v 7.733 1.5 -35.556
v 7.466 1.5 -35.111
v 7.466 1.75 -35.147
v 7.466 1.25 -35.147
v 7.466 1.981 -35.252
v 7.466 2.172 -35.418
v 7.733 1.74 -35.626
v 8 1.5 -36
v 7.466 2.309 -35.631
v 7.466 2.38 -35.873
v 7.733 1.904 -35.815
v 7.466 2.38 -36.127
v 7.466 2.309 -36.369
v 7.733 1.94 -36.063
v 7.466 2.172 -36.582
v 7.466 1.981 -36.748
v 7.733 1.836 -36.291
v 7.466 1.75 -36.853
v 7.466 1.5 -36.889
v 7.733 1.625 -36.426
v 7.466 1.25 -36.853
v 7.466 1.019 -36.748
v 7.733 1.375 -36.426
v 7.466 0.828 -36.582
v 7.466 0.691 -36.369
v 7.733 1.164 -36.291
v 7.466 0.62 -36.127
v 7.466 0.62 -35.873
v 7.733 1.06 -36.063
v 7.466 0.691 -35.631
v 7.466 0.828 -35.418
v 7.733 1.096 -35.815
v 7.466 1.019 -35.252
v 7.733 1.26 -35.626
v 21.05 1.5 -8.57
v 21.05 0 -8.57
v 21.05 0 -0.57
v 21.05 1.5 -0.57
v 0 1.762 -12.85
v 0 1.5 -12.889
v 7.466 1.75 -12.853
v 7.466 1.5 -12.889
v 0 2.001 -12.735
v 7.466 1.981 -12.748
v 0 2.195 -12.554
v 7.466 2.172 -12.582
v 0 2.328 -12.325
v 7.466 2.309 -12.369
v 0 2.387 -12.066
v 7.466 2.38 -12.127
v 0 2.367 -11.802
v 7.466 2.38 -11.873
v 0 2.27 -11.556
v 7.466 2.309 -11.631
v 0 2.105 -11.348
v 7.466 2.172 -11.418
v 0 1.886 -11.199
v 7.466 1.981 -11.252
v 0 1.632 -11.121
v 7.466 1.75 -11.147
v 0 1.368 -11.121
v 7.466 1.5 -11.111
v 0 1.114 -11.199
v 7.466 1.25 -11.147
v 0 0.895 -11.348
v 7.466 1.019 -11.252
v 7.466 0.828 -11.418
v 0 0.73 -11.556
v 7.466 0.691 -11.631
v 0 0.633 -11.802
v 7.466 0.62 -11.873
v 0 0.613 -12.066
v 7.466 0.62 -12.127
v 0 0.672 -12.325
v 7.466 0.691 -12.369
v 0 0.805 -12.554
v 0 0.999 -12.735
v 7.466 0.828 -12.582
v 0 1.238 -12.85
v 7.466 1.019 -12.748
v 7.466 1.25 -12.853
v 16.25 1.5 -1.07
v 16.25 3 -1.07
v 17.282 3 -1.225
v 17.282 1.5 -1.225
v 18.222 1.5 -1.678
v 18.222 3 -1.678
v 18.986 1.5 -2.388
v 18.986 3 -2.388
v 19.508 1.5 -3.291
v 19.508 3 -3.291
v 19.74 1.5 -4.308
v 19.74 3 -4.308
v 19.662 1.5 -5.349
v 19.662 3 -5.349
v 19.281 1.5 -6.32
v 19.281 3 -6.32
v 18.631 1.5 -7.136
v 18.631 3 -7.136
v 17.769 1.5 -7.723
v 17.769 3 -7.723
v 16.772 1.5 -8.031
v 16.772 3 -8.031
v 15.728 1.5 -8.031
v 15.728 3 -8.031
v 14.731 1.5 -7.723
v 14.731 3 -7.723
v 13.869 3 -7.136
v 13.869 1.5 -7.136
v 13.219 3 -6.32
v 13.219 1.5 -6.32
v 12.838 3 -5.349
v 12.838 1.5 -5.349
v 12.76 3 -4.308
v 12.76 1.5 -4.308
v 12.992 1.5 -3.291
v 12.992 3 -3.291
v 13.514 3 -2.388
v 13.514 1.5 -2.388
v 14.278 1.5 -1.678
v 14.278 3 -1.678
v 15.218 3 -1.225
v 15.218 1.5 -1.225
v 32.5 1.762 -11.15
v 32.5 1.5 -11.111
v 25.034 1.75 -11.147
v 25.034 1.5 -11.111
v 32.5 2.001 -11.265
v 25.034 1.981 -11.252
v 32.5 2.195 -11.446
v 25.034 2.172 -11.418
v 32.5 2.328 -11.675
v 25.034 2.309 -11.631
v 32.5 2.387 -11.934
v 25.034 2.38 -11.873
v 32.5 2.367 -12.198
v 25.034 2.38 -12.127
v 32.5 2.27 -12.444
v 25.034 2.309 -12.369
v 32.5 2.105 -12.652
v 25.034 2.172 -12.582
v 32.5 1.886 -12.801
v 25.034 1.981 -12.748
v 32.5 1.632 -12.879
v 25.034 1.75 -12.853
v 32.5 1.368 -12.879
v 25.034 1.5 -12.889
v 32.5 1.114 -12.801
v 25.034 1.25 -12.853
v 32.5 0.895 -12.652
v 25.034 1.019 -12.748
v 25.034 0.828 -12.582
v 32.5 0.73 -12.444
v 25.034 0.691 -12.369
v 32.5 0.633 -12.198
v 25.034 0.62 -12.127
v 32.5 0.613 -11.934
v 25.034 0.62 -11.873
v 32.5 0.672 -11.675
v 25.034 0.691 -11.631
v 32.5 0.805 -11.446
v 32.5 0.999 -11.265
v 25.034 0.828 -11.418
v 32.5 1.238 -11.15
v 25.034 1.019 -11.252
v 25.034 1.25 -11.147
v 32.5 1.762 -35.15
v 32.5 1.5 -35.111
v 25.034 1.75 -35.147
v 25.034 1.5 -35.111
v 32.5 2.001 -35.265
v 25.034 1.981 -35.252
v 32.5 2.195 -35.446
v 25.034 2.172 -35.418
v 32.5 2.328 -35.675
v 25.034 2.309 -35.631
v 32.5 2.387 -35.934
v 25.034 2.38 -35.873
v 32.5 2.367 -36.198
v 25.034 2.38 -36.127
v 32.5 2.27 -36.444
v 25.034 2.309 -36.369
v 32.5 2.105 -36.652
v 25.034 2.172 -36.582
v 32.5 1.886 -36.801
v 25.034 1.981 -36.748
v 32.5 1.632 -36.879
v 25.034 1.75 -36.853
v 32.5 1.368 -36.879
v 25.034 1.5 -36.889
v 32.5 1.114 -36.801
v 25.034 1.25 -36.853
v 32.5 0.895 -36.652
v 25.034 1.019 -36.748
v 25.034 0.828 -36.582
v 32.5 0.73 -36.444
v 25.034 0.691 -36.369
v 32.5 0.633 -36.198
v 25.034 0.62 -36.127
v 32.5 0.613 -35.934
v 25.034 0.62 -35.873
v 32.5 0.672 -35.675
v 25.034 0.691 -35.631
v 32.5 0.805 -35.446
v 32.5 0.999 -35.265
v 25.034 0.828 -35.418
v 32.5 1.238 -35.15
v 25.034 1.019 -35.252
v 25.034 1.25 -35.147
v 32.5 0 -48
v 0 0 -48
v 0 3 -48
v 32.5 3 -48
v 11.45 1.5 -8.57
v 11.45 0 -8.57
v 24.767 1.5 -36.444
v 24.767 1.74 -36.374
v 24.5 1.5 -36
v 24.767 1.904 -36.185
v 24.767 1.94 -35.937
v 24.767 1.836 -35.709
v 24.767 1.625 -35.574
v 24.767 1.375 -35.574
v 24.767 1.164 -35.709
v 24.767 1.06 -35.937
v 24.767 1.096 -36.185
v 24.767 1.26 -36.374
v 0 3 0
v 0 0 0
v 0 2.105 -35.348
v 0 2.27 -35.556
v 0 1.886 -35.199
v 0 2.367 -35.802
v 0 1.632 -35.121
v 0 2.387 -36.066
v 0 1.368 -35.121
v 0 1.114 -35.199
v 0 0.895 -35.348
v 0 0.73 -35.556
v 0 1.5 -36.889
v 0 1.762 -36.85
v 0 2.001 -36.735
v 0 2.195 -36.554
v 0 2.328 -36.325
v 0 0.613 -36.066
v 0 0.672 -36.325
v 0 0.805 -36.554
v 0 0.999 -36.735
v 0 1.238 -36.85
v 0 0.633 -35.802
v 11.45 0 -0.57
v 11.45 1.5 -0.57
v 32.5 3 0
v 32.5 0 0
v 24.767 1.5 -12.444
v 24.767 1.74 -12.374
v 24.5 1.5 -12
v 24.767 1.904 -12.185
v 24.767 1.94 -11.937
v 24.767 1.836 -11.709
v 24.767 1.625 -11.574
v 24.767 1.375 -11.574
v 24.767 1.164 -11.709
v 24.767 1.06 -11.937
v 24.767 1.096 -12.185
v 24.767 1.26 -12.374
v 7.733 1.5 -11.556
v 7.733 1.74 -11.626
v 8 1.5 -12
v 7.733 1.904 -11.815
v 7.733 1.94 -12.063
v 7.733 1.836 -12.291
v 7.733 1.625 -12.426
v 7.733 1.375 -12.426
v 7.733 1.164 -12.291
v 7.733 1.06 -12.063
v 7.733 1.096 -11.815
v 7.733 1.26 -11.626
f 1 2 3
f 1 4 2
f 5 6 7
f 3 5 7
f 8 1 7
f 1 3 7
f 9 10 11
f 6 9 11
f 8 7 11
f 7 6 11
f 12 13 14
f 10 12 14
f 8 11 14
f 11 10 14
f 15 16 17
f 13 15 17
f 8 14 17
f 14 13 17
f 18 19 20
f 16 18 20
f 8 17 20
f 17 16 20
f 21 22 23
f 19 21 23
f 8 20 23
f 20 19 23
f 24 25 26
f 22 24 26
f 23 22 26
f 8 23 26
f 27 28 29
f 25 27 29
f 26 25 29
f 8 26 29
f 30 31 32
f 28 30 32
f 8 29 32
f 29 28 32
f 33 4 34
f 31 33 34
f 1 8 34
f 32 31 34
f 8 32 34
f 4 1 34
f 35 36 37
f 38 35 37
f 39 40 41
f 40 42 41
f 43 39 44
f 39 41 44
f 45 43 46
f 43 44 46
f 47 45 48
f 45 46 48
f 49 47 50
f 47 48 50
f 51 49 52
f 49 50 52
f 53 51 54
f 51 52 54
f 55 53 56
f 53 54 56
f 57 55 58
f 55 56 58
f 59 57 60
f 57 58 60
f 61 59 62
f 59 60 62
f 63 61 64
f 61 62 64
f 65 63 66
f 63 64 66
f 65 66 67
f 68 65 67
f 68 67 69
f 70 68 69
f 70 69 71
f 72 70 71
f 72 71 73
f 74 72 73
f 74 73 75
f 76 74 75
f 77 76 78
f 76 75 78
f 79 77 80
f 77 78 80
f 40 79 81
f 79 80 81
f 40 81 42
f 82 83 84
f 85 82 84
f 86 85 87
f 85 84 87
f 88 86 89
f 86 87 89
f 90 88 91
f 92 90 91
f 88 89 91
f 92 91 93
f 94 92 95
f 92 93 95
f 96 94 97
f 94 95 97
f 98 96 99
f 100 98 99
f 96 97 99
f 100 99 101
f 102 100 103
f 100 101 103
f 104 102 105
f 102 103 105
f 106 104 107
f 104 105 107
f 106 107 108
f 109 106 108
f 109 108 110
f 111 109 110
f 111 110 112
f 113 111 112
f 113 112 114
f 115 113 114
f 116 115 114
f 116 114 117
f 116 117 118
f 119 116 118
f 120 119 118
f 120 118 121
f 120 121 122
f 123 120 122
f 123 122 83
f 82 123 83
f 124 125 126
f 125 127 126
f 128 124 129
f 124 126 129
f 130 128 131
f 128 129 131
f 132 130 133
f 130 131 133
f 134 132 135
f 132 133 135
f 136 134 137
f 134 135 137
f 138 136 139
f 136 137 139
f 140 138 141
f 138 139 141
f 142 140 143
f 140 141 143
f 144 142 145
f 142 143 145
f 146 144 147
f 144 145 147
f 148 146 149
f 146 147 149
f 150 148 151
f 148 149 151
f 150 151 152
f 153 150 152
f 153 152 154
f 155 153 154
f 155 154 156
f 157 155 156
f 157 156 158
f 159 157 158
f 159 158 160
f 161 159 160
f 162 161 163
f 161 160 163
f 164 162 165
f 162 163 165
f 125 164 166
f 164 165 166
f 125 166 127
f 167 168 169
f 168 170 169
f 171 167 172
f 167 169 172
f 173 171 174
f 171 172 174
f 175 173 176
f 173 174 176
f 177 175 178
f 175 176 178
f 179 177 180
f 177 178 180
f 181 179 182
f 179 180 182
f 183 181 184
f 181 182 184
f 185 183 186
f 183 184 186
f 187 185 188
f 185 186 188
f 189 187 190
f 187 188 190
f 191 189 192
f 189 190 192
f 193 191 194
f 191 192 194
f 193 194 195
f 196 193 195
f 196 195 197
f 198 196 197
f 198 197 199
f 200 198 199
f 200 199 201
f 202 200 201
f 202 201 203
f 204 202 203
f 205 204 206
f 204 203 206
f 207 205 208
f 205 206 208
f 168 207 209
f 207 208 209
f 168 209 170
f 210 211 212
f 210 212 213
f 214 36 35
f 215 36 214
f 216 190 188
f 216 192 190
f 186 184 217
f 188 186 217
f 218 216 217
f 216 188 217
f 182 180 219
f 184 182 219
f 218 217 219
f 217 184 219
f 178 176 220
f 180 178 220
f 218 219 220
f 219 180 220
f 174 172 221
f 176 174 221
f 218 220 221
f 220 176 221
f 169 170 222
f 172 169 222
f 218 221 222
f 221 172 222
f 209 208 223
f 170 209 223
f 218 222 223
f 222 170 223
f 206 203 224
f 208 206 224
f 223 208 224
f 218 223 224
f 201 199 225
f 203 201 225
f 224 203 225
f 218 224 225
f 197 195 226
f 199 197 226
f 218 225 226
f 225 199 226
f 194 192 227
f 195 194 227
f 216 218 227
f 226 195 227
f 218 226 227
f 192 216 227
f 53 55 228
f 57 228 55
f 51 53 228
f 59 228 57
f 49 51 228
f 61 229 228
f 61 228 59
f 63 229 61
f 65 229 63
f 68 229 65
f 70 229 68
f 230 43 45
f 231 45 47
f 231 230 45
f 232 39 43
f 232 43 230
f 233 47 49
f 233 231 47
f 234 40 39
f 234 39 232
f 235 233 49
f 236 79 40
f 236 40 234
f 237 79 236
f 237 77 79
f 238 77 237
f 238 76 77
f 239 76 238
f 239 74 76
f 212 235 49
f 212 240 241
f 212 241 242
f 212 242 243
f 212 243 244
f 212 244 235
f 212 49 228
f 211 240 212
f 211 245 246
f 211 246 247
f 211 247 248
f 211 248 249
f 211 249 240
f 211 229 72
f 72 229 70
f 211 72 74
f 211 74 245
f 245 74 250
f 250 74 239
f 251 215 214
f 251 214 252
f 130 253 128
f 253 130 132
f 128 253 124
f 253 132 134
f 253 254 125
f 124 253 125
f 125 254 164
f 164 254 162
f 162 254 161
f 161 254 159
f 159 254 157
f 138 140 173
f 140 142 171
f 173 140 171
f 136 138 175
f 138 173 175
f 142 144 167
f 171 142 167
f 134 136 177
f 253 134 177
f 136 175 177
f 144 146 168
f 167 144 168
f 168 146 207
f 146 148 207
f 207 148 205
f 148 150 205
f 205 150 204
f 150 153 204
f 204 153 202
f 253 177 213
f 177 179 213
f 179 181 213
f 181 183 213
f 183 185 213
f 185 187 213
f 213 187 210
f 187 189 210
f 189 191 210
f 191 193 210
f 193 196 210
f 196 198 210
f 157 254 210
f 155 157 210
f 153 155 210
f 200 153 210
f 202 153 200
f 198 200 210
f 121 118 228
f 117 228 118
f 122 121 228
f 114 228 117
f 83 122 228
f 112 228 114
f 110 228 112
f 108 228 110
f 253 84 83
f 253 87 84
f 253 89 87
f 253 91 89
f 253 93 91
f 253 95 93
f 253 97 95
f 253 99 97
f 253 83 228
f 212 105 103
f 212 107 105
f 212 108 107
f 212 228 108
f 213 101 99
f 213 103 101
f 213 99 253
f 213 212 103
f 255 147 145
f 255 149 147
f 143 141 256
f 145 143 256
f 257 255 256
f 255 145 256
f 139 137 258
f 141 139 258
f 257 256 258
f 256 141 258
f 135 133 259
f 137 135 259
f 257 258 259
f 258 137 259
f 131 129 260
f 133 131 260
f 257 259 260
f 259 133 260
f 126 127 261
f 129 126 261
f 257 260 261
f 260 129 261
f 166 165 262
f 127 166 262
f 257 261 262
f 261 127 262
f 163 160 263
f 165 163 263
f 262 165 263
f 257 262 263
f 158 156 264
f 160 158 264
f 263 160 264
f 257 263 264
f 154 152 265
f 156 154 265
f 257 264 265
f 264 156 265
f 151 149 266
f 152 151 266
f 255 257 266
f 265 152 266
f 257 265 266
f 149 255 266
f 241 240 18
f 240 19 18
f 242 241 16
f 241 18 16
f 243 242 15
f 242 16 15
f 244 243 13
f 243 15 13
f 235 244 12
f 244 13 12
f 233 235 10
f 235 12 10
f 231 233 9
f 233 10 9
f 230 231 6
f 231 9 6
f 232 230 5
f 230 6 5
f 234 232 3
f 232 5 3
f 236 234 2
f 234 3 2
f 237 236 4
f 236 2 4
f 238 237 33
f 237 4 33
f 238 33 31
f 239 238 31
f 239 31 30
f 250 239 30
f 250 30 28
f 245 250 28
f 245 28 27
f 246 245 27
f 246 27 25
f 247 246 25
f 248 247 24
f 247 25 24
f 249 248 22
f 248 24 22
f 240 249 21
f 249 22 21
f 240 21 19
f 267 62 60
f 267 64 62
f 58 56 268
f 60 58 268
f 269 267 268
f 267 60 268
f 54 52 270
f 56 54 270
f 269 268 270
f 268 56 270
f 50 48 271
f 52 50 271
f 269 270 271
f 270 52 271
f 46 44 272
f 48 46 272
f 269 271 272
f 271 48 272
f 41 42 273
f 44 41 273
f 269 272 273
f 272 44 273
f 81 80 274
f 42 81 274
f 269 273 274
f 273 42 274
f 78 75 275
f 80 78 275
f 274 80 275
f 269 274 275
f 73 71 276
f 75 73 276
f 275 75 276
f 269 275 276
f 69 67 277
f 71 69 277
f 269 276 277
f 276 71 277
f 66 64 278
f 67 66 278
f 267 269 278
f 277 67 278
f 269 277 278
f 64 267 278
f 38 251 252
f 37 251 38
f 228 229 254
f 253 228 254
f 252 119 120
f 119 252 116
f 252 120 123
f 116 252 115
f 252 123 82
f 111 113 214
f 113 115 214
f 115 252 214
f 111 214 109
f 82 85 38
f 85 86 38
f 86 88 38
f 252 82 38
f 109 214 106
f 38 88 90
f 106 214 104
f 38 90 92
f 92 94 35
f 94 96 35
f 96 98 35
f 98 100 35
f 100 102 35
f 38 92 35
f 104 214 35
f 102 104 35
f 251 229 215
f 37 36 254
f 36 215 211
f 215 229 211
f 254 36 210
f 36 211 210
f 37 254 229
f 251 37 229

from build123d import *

# Parameters (mm, degrees)
SKETCH1_W                 = 32.5
SKETCH1_H                 = 48
BOSS_EXTRUDE1_DEPTH       = 3
F_2_56_TAPPED_HOLE1_D     = 1.778
F_2_56_TAPPED_HOLE1_DEPTH = 7.46583491
F_2_56_TAPPED_HOLE1_TIP   = 0.53416509
F_2_56_TAPPED_HOLE2_D     = 1.778
F_2_56_TAPPED_HOLE2_DEPTH = 7.46583491
F_2_56_TAPPED_HOLE2_TIP   = 0.53416509
CUT_EXTRUDE2_DEPTH        = 1.5
SKETCH10_R                = 3.5
CUT_EXTRUDE3_DEPTH        = 3


with BuildPart() as part:
    # Sketch1 → Boss-Extrude1 (new body)
    with BuildSketch(Plane(origin=(0, 0, 0), x_dir=(1, 0, 0), z_dir=(0, 1, 0))):
        with Locations((16.25, 24)):
            Rectangle(SKETCH1_W, SKETCH1_H)
    extrude(amount=BOSS_EXTRUDE1_DEPTH)

    # #2-56 Tapped Hole1
    with Locations(Plane.ZY):
        with Locations((-36, 1.5), (-12, 1.5)):
            Hole(F_2_56_TAPPED_HOLE1_D / 2, depth=F_2_56_TAPPED_HOLE1_DEPTH)
            with Locations((0, 0, -(F_2_56_TAPPED_HOLE1_DEPTH + F_2_56_TAPPED_HOLE1_TIP / 2))):  # 118° drill point
                Cone(0, F_2_56_TAPPED_HOLE1_D / 2, F_2_56_TAPPED_HOLE1_TIP, mode=Mode.SUBTRACT)

    # #2-56 Tapped Hole2
    with Locations(Plane(origin=(32.5, 0, 0), x_dir=(0, 0, -1), z_dir=(1, 0, 0))):
        with Locations((12, 1.5), (36, 1.5)):
            Hole(F_2_56_TAPPED_HOLE2_D / 2, depth=F_2_56_TAPPED_HOLE2_DEPTH)
            with Locations((0, 0, -(F_2_56_TAPPED_HOLE2_DEPTH + F_2_56_TAPPED_HOLE2_TIP / 2))):  # 118° drill point
                Cone(0, F_2_56_TAPPED_HOLE2_D / 2, F_2_56_TAPPED_HOLE2_TIP, mode=Mode.SUBTRACT)

    # Sketch11 → Cut-Extrude2 (cut)
    with BuildSketch(Plane(origin=(0, 0, 0), x_dir=(-1, 0, 0), z_dir=(0, -1, 0))):
        Polygon((-21.05, 4.57), (-21.05, 8.57), (-11.45, 8.57), (-11.45, 0.57), (-21.05, 0.57), align=None)
    extrude(amount=-CUT_EXTRUDE2_DEPTH, mode=Mode.SUBTRACT)

    # Sketch10 → Cut-Extrude3 (cut)
    with BuildSketch(Plane(origin=(0, 3, 0), x_dir=(1, 0, 0), z_dir=(0, 1, 0))):
        with Locations(Location((16.25, 4.57, 0), (0, 0, 270))):
            Circle(SKETCH10_R)
    extrude(amount=-CUT_EXTRUDE3_DEPTH, mode=Mode.SUBTRACT)


solid = part.part
